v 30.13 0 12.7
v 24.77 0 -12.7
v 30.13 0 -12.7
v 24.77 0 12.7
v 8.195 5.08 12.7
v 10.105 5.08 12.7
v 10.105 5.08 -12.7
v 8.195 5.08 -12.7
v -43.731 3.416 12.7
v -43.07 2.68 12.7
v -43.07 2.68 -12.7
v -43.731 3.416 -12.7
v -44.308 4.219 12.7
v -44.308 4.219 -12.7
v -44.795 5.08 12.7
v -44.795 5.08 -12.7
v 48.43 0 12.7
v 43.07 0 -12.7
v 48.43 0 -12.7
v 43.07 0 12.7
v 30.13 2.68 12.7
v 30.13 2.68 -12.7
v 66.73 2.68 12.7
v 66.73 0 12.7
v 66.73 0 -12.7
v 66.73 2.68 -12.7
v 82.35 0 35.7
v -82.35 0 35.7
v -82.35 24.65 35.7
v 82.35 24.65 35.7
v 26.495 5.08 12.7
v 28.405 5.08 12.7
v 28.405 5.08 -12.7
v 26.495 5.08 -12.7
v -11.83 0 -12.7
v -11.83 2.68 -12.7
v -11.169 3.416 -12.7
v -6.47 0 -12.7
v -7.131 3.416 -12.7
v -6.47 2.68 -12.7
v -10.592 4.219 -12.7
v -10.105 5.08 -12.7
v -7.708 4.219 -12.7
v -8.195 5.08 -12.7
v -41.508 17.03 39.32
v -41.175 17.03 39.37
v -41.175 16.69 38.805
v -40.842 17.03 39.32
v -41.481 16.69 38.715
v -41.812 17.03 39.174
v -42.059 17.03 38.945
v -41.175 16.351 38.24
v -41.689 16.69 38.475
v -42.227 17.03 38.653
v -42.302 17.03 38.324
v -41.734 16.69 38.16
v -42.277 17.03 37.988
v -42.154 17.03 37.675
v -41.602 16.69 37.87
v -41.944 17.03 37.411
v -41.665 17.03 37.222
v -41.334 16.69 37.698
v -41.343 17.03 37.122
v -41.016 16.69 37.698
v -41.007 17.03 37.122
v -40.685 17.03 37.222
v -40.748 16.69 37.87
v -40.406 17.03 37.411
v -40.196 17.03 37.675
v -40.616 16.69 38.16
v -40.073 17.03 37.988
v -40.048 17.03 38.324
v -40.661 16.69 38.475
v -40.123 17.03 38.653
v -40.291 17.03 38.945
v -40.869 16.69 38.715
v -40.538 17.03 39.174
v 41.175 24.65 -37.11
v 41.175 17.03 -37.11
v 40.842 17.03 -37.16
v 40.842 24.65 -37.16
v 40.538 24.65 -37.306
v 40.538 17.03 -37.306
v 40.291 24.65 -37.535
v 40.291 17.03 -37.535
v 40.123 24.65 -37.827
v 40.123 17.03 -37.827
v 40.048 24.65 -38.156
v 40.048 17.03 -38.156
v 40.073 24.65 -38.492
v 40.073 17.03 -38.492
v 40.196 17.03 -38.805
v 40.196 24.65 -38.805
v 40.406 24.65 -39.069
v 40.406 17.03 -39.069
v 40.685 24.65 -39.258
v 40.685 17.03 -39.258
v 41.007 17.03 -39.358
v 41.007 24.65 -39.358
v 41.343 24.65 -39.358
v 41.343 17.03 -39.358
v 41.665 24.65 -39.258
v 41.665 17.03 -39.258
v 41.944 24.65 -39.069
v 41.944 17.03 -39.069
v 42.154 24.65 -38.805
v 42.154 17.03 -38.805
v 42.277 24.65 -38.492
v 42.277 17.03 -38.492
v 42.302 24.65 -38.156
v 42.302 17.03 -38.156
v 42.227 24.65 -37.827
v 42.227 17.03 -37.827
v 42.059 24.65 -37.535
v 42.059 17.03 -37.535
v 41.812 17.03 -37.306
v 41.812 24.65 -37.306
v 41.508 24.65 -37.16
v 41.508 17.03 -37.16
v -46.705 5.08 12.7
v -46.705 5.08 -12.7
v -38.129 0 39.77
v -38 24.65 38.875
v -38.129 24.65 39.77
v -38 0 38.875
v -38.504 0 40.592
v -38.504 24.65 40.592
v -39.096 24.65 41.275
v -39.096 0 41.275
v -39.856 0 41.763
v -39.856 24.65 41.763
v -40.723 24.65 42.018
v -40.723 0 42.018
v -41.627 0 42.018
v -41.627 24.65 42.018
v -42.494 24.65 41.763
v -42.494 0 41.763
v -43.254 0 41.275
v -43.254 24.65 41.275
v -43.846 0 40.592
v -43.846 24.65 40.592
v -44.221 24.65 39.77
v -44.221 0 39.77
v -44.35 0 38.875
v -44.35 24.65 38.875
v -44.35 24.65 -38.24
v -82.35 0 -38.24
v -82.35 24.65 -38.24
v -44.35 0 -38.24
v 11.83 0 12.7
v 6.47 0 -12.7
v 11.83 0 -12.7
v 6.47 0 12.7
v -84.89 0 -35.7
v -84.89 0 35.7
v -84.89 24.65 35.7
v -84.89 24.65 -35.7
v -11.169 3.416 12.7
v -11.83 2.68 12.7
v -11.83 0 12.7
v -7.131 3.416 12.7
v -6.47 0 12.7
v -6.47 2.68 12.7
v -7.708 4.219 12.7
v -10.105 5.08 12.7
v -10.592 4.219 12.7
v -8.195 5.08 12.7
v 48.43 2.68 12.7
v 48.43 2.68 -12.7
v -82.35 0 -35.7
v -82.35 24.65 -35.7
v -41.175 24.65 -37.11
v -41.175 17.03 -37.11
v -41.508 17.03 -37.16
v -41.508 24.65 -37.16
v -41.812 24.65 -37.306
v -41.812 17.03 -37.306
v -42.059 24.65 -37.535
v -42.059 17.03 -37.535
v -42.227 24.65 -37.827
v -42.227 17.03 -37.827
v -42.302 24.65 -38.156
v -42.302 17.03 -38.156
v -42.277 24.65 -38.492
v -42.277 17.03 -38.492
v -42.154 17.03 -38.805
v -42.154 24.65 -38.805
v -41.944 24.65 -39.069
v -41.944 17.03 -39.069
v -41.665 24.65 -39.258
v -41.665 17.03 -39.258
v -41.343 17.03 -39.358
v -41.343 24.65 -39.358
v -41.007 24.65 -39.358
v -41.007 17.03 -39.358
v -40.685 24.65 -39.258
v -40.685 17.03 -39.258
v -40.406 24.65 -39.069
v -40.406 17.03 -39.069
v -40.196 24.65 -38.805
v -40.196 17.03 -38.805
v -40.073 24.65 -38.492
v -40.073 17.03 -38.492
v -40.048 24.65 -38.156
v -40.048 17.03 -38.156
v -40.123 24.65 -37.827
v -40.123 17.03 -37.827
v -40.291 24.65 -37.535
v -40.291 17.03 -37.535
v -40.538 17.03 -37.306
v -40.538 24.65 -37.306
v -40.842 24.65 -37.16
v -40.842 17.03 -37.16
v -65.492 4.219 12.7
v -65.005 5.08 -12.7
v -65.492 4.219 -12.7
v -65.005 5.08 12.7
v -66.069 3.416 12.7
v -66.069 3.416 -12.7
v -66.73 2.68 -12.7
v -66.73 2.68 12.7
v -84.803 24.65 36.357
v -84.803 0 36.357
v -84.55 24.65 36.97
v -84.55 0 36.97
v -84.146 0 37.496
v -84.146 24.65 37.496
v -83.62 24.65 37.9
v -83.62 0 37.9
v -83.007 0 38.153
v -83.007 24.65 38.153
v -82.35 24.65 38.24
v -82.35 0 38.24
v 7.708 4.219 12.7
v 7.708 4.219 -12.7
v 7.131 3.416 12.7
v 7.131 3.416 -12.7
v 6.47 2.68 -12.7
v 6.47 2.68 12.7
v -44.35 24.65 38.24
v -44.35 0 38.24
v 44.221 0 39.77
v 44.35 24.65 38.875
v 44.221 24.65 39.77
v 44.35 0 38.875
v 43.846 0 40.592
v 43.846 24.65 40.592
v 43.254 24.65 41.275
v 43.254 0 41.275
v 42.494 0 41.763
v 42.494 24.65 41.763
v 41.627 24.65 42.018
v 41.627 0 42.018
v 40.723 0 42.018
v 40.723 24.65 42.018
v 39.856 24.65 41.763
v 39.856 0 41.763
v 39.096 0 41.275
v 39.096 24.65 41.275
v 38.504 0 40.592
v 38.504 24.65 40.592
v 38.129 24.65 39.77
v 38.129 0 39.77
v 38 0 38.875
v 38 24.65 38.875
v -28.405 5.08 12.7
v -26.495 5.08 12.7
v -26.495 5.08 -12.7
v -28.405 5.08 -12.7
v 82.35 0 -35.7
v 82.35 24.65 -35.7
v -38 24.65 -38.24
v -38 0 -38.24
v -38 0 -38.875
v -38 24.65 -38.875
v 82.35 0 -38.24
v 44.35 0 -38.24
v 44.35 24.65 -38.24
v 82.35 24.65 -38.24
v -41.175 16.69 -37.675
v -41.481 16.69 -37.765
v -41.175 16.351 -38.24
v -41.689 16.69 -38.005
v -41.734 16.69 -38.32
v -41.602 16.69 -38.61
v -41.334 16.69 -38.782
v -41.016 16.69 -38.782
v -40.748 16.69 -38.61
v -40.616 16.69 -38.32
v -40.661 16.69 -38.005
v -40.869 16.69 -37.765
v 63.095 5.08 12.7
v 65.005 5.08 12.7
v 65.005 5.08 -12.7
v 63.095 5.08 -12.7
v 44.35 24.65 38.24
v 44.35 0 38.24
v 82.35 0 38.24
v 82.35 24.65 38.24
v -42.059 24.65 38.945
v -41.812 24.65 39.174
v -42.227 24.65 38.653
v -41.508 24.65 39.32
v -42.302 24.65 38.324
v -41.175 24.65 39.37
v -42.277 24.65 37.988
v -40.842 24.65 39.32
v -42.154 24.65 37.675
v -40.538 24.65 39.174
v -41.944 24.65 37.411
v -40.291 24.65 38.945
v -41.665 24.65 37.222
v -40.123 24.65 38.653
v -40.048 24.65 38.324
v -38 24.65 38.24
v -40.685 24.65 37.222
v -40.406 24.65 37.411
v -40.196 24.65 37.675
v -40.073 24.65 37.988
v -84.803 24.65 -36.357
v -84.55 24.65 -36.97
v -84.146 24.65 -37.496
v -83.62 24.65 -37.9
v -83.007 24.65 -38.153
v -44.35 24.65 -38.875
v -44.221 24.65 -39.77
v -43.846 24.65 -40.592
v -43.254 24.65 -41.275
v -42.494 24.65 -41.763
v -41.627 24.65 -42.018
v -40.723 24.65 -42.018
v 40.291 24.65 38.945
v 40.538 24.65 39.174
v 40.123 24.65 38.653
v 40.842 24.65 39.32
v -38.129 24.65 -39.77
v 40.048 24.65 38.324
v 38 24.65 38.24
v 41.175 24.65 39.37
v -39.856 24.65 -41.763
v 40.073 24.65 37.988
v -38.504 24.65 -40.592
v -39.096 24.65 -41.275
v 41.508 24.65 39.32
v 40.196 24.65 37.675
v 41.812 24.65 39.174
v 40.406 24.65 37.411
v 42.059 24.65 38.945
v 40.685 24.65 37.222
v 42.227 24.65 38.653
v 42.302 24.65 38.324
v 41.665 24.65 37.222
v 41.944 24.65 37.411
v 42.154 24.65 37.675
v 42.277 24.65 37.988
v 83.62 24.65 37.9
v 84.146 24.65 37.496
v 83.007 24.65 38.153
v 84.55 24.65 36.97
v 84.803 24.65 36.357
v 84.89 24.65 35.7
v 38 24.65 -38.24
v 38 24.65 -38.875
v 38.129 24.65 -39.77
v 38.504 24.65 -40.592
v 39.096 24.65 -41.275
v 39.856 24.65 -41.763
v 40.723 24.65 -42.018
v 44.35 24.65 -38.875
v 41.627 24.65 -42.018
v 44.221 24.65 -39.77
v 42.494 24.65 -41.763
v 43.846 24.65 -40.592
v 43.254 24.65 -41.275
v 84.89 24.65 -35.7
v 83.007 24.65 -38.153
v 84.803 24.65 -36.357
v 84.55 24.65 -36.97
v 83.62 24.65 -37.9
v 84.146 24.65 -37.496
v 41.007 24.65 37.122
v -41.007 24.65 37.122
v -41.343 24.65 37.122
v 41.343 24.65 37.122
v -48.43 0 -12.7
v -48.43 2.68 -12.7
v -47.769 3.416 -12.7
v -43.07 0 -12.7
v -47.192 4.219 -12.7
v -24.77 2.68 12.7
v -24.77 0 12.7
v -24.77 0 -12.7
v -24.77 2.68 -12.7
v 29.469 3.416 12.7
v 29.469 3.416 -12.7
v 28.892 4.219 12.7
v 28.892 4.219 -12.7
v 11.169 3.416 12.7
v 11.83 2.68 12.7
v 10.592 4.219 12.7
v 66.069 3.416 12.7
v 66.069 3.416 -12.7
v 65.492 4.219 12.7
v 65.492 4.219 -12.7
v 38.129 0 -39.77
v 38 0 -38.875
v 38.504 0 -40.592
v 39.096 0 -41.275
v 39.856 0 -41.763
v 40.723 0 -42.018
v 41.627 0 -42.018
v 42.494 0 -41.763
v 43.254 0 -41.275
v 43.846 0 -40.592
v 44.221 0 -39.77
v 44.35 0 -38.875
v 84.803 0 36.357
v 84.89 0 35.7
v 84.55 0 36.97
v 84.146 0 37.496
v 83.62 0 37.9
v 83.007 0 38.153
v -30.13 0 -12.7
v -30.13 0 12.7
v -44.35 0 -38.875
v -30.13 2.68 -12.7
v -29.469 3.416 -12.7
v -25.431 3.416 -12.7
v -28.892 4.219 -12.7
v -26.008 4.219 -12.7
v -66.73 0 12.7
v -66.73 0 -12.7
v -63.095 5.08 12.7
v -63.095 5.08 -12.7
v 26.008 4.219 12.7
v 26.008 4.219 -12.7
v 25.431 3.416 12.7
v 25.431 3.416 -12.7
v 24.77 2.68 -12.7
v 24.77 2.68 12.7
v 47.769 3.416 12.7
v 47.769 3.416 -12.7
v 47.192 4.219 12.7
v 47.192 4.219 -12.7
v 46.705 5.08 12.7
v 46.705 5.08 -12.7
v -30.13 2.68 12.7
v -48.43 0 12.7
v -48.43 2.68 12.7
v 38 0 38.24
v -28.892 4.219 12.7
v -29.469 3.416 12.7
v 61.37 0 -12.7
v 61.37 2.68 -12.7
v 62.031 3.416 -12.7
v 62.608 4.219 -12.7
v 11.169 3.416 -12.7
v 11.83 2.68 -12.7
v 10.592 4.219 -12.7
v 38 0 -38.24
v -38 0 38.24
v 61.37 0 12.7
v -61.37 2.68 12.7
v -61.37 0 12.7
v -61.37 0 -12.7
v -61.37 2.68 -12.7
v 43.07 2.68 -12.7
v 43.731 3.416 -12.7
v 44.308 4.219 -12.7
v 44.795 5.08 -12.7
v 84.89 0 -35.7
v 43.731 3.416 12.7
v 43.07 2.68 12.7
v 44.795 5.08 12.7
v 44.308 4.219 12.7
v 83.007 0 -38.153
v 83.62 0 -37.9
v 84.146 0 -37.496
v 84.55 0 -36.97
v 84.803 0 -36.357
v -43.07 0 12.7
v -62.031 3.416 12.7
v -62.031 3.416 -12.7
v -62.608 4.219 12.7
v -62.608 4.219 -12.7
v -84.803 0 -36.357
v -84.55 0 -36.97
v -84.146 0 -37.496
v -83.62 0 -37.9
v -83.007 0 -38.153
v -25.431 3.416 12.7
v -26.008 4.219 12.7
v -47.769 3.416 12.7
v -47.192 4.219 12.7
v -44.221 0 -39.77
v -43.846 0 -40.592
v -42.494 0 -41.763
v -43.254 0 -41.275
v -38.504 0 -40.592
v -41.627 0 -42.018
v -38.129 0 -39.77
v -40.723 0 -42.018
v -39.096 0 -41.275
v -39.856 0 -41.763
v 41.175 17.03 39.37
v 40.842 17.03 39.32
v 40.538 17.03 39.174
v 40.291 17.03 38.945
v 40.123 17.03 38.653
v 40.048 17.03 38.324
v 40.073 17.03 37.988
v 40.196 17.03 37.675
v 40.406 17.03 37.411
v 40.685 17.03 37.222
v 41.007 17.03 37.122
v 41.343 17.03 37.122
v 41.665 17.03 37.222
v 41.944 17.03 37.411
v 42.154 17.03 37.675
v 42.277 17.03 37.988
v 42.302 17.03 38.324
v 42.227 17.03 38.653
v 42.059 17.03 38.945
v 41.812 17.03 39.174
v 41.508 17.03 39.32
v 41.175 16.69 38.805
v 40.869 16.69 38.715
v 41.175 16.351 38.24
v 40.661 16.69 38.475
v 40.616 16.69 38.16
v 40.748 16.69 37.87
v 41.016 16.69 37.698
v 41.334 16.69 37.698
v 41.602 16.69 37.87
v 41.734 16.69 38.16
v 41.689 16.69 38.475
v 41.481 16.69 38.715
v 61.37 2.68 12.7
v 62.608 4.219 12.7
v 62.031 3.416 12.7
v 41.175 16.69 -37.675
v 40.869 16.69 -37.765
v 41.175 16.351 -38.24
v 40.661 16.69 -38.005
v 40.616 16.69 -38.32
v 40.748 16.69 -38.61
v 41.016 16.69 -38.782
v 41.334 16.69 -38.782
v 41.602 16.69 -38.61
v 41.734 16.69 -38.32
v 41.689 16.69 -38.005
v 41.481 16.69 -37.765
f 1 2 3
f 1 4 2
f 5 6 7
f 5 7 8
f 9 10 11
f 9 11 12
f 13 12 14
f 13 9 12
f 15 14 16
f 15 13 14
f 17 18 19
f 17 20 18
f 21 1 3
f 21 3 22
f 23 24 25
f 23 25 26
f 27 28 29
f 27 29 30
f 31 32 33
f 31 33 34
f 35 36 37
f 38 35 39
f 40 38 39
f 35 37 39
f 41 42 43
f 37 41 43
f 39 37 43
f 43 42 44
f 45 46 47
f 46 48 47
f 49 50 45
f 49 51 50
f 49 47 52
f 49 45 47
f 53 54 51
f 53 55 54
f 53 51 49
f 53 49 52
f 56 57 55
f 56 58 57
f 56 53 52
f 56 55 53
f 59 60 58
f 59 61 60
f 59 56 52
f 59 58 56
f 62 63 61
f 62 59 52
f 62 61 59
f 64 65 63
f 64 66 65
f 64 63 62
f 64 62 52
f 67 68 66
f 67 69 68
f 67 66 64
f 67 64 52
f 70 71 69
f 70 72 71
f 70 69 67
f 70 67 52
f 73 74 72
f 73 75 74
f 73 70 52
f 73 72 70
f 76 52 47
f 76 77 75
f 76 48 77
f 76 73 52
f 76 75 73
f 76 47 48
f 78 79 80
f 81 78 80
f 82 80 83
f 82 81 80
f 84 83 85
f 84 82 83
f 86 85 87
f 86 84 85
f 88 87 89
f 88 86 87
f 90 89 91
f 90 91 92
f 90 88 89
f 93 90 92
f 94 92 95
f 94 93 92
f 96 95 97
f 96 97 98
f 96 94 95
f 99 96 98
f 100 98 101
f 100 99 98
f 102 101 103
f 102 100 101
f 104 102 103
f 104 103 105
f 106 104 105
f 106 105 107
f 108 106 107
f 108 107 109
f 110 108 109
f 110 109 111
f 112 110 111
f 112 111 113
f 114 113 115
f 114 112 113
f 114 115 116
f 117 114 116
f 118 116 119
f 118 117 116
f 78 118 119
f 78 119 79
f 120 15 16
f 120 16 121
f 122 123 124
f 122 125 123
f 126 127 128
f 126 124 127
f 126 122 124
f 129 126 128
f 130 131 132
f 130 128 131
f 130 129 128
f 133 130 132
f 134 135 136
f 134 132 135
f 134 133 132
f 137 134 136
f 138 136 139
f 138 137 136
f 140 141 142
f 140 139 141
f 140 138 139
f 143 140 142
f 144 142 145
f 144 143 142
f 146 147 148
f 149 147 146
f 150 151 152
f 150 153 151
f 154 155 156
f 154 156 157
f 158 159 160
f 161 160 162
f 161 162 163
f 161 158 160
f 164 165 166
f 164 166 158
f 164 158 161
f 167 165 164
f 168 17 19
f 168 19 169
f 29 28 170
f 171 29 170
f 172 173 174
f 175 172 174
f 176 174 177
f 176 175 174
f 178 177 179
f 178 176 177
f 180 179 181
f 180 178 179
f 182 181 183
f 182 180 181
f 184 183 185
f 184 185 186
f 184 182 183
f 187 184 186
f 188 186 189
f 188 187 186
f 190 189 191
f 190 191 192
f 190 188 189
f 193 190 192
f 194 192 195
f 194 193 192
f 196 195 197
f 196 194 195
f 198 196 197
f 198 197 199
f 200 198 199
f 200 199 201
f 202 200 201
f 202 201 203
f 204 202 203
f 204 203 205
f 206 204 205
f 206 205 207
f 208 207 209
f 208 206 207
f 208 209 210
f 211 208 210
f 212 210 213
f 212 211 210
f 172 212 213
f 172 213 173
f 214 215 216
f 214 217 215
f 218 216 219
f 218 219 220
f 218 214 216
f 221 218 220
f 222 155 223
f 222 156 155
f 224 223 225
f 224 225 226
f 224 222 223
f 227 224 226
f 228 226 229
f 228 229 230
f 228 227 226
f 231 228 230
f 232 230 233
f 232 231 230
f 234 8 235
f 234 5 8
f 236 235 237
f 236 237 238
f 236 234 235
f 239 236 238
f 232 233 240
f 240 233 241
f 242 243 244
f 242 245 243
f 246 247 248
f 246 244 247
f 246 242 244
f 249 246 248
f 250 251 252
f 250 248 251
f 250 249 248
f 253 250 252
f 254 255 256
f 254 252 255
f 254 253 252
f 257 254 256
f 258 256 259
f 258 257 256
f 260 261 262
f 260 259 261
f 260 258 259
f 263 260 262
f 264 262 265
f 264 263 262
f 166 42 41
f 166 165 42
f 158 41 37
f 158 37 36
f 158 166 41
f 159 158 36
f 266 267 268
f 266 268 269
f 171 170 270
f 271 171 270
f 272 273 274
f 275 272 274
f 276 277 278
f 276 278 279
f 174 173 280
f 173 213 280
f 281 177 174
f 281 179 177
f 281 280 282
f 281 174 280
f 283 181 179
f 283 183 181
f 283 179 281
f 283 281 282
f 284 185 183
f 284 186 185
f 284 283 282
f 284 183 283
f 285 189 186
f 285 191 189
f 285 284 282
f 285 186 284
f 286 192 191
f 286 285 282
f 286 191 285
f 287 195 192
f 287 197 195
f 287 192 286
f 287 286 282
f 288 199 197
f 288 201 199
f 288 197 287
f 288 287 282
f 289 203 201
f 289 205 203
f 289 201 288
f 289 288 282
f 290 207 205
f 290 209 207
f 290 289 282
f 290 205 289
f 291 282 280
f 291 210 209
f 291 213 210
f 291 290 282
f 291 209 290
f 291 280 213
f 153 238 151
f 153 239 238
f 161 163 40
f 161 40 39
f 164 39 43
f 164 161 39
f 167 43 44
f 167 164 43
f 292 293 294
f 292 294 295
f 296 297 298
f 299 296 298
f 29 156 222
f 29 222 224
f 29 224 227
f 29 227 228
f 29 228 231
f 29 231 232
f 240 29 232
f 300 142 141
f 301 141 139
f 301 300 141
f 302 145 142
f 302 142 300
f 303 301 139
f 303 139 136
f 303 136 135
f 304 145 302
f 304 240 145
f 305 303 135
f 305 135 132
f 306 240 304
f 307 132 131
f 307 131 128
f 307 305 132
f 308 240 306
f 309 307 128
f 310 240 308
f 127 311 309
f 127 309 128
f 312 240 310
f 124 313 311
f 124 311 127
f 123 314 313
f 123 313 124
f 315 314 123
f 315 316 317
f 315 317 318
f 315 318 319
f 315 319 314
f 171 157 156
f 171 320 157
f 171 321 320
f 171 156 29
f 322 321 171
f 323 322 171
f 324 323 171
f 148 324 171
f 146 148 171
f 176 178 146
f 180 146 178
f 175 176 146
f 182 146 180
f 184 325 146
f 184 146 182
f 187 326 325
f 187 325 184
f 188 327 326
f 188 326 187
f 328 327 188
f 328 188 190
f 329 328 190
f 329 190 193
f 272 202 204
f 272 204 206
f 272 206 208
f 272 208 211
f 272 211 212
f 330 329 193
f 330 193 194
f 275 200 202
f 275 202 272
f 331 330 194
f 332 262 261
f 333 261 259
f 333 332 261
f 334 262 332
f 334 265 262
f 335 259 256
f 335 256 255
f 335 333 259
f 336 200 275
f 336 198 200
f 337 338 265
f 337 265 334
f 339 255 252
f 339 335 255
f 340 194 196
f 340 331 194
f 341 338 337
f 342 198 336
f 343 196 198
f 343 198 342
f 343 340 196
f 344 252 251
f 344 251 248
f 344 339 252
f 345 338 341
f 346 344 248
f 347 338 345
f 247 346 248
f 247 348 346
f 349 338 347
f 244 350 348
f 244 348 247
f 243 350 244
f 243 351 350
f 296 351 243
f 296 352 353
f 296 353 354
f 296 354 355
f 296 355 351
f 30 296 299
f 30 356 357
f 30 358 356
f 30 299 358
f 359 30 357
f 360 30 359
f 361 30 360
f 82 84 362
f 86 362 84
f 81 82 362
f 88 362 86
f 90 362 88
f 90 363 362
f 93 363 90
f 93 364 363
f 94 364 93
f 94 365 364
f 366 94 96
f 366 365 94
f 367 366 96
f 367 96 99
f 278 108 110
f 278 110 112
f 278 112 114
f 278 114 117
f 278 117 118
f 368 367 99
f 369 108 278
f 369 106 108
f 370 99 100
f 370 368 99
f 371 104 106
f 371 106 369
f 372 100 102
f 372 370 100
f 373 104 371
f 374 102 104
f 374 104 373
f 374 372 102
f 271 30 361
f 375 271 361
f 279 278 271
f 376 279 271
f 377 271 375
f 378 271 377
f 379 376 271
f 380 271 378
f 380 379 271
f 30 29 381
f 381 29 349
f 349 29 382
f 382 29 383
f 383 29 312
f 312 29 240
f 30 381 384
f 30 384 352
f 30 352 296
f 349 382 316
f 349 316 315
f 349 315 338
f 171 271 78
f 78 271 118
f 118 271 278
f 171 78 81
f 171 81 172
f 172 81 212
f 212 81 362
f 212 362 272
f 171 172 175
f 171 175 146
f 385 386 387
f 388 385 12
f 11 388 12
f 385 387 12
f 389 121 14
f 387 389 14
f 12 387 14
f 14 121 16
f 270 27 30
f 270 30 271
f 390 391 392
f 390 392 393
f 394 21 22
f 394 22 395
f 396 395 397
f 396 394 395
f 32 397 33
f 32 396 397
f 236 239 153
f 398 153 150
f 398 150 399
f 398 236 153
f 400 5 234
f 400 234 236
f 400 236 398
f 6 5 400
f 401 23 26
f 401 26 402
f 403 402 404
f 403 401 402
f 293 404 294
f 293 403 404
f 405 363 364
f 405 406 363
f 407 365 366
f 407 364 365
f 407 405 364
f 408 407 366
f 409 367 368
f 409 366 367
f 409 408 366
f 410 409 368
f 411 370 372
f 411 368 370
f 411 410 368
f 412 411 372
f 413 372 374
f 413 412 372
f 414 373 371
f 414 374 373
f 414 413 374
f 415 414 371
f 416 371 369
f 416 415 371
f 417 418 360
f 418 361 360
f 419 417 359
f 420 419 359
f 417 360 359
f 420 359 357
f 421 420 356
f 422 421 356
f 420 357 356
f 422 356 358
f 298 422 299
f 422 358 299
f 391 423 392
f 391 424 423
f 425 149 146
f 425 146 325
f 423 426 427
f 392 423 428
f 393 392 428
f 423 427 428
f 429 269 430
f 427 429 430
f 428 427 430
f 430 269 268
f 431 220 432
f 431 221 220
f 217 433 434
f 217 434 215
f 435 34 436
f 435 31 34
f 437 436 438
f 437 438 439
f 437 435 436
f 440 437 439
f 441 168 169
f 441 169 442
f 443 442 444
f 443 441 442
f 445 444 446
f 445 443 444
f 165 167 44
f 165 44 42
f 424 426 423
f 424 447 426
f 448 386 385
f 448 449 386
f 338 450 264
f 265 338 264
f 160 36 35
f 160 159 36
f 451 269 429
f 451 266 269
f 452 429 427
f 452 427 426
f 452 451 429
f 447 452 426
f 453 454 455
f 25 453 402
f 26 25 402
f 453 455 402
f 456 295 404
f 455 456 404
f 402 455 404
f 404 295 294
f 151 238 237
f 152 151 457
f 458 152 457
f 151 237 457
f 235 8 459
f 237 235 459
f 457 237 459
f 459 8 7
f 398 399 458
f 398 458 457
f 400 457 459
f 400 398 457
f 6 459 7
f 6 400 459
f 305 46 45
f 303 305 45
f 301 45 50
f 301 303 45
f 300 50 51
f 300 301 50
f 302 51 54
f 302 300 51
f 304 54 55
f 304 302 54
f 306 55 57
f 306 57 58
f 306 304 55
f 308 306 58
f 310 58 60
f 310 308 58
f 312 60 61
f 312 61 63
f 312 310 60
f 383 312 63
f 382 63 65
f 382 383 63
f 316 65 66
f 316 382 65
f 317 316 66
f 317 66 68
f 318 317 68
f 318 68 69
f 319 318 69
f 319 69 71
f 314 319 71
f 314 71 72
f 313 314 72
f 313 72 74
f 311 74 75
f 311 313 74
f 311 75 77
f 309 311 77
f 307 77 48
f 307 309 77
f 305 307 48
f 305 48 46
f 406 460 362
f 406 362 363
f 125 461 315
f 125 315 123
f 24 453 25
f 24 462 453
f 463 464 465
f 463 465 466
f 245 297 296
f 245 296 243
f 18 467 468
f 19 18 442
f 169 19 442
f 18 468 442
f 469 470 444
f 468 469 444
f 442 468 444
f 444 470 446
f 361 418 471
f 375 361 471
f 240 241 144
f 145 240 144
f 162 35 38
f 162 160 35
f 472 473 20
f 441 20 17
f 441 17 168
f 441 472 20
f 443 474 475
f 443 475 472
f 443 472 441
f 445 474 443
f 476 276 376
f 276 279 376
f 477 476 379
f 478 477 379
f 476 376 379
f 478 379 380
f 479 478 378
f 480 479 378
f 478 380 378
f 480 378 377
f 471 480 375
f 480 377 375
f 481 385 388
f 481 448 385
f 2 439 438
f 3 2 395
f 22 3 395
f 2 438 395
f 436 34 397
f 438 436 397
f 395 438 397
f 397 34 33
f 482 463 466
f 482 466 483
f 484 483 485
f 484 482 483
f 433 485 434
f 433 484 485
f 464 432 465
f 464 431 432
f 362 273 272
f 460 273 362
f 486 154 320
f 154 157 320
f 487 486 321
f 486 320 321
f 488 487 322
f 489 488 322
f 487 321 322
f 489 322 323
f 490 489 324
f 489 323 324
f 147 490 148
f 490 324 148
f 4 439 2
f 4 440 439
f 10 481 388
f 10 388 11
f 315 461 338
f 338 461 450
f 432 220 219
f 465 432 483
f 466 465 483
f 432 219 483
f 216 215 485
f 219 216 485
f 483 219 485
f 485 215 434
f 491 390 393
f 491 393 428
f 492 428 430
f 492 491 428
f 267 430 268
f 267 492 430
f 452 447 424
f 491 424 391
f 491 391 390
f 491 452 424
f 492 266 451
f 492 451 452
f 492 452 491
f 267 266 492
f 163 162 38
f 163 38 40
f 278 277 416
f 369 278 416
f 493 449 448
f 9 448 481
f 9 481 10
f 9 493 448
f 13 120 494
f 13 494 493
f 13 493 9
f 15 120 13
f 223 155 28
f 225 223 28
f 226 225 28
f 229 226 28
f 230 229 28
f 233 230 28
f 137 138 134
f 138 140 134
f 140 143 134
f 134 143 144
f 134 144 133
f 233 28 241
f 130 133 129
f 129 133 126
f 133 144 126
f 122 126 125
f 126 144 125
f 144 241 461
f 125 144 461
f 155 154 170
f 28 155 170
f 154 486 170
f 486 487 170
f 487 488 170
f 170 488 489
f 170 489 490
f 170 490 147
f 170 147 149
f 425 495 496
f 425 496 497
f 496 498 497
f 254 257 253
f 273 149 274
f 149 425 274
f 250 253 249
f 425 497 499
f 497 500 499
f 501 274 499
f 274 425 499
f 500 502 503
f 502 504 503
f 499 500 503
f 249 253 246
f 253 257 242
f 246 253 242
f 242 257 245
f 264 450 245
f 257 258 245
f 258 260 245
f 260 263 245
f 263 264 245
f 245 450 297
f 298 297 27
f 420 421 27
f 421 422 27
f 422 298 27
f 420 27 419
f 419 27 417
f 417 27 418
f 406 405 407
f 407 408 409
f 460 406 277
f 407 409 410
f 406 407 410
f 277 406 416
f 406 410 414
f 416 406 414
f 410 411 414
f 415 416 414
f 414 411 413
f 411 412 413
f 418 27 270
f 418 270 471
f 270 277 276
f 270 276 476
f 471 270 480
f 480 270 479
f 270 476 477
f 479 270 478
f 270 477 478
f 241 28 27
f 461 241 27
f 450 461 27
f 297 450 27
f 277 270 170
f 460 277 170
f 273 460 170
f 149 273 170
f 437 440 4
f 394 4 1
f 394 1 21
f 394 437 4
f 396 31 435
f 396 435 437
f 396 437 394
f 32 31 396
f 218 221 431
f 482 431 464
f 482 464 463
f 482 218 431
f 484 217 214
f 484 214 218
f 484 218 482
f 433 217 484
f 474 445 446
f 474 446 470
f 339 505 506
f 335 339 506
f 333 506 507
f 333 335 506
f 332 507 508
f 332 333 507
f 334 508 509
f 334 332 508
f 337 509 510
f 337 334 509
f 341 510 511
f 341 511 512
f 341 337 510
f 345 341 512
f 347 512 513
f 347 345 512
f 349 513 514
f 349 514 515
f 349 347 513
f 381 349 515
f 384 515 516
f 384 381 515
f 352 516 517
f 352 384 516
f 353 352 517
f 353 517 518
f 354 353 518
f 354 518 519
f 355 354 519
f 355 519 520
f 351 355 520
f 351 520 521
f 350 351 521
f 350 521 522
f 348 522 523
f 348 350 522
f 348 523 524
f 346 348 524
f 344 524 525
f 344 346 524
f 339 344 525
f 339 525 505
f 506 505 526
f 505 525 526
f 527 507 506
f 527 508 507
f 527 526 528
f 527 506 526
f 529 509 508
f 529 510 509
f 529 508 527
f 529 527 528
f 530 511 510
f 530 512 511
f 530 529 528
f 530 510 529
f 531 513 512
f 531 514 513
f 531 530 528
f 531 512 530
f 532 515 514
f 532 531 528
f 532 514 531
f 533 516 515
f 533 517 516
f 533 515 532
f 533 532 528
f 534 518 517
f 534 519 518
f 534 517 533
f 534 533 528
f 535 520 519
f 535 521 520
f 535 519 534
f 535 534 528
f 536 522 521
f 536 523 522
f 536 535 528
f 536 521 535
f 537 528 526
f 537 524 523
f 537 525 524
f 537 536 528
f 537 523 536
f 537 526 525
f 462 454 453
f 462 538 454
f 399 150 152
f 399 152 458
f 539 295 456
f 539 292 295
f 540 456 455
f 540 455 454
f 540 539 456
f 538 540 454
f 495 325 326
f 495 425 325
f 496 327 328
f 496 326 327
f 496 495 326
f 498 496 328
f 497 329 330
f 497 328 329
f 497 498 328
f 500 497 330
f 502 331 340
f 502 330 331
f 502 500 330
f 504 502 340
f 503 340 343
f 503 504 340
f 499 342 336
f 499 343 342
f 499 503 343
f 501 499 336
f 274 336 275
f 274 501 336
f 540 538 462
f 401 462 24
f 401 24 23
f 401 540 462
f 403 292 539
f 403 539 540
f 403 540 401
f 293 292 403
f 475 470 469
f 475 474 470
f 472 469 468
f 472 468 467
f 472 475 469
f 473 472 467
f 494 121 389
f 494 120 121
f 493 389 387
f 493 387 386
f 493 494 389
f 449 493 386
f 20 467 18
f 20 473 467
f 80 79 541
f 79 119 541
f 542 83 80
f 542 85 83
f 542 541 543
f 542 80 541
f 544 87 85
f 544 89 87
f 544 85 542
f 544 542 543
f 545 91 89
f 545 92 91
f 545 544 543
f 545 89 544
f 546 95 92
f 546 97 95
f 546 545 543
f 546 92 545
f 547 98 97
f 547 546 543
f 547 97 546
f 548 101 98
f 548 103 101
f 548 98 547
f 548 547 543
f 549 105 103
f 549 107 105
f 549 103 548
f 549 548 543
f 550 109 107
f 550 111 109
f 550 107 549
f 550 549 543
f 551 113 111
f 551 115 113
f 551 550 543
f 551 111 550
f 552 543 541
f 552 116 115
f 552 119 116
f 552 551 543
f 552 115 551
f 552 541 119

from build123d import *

# Parameters (mm, degrees)
BOSS_EXTRUDE1_OUTLINE_W        = 169.78
BOSS_EXTRUDE1_OUTLINE_H        = 76.48
BOSS_EXTRUDE1_OUTLINE_W_2      = 164.7
BOSS_EXTRUDE1_OUTLINE_H_2      = 71.4
BOSS_EXTRUDE1_DEPTH            = 24.65
BOSS_EXTRUDE2_DEPTH            = 12.7
LPATTERN2_COUNT                = 8
LPATTERN2_PITCH                = 18.3
SKETCH6_W                      = 6.35
SKETCH6_H                      = 3.81
BOSS_EXTRUDE3_DEPTH            = 24.65
MIRROR2_COPY_1_SKETCH_W        = 6.35
MIRROR2_COPY_1_SKETCH_H        = 3.81
MIRROR2_COPY_1_DEPTH           = 24.65
F_4_40_TAPPED_HOLE1_AT_2_COUNT = 2
F_4_40_TAPPED_HOLE1_AT_2_PITCH = 82.35
F_4_40_TAPPED_HOLE1_AT_3_COUNT = 2
F_4_40_TAPPED_HOLE1_AT_3_PITCH = 112.386444467
F_4_40_TAPPED_HOLE1_AT_4_COUNT = 2
F_4_40_TAPPED_HOLE1_AT_4_PITCH = 76.48
FILLET1_RADIUS                 = 3.175
FILLET1_LENGTH                 = 24.65
FILLET2_RADIUS                 = 3.175
FILLET2_LENGTH                 = 24.65
FILLET3_RADIUS                 = 3.175
FILLET3_LENGTH                 = 24.65
FILLET4_RADIUS                 = 3.175
FILLET4_LENGTH                 = 24.65
FILLET5_R                      = 2.54


# Read off the part's stored shape, not the designer's step: Boss-Extrude1
with BuildPart() as part:
    # Boss-Extrude1 outline → Boss-Extrude1 (new body)
    with BuildSketch(Plane(origin=(0, 0, 0), x_dir=(1, 0, 0), z_dir=(0, 1, 0))):
        Rectangle(BOSS_EXTRUDE1_OUTLINE_W, BOSS_EXTRUDE1_OUTLINE_H)
        Rectangle(BOSS_EXTRUDE1_OUTLINE_W_2, BOSS_EXTRUDE1_OUTLINE_H_2, mode=Mode.SUBTRACT)
    extrude(amount=BOSS_EXTRUDE1_DEPTH)

    # Sketch6 → Boss-Extrude3 (add)
    with BuildSketch(Plane(origin=(0, 24.65, 0), x_dir=(1, 0, 0), z_dir=(0, 1, 0))):
        with Locations((-41.175, 40.145)):
            Rectangle(SKETCH6_W, SKETCH6_H)
    boss_extrude3 = extrude(amount=-BOSS_EXTRUDE3_DEPTH)

    # Mirror1: Boss-Extrude3 across plane
    add(boss_extrude3.mirror(Plane(origin=(0, 0, 0), x_dir=(0, 0, 1), z_dir=(1, 0, 0))))

    # Mirror2: Boss-Extrude3 across plane
    add(boss_extrude3.mirror(Plane.XY))

    # Mirror2 copy 1 sketch → Mirror2 copy 1 (add)
    with BuildSketch(Plane(origin=(0, 24.65, 0), x_dir=(-1, 0, 0), z_dir=(0, 1, 0))):
        with Locations((-41.175, 40.145)):
            Rectangle(MIRROR2_COPY_1_SKETCH_W, MIRROR2_COPY_1_SKETCH_H)
    extrude(amount=-MIRROR2_COPY_1_DEPTH)

    # Sketch7 → #4-40 Tapped Hole1 (revolve, cut)
    with BuildSketch(Plane(origin=(-41.175, 24.65, -38.24), x_dir=(0, 0, 1), z_dir=(1, 0, 0))):
        Polygon((0, 0), (0, 8.299152758), (1.1303, 7.62), (1.1303, 0), align=None)
    f_4_40_tapped_hole1 = revolve(axis=Axis((-41.175, 31, -38.24), (0, -1, 0)), mode=Mode.SUBTRACT)

    # #4-40 Tapped Hole1 at 2: #4-40 Tapped Hole1 ×2
    with Locations(*[(i * F_4_40_TAPPED_HOLE1_AT_2_PITCH, 0, 0) for i in range(1, F_4_40_TAPPED_HOLE1_AT_2_COUNT)]):
        add(f_4_40_tapped_hole1, mode=Mode.SUBTRACT)

    # #4-40 Tapped Hole1 at 3: #4-40 Tapped Hole1 ×2
    with Locations(*[Vector(0.732739614553475, 0, 0.6805091162240408) * (i * F_4_40_TAPPED_HOLE1_AT_3_PITCH) for i in range(1, F_4_40_TAPPED_HOLE1_AT_3_COUNT)]):
        add(f_4_40_tapped_hole1, mode=Mode.SUBTRACT)

    # #4-40 Tapped Hole1 at 4: #4-40 Tapped Hole1 ×2
    with Locations(*[(0, 0, i * F_4_40_TAPPED_HOLE1_AT_4_PITCH) for i in range(1, F_4_40_TAPPED_HOLE1_AT_4_COUNT)]):
        add(f_4_40_tapped_hole1, mode=Mode.SUBTRACT)

    # Fillet1: full round fillet: the end face becomes a half cylinder, R = half its width
    fillet1_face = Plane((-41.175, 12.325, -42.05), x_dir=(0, -1, 0), z_dir=(0, 0, -1))  # on the end face: x along it, z out of the body
    fillet1_slab = fillet1_face.offset(-FILLET1_RADIUS / 2) * Box(FILLET1_LENGTH, 2 * FILLET1_RADIUS, FILLET1_RADIUS, mode=Mode.PRIVATE)  # the body's end, R deep
    fillet1_round = Plane((-41.175, 12.325, -38.875), x_dir=(0, 0, -1), z_dir=(0, -1, 0)) * Cylinder(FILLET1_RADIUS, FILLET1_LENGTH, mode=Mode.PRIVATE)  # its axis R under the face
    add(fillet1_slab - fillet1_round, mode=Mode.SUBTRACT)

    # Fillet2: full round fillet: the end face becomes a half cylinder, R = half its width
    fillet2_face = Plane((41.175, 12.325, -42.05), x_dir=(0, -1, 0), z_dir=(0, 0, -1))  # on the end face: x along it, z out of the body
    fillet2_slab = fillet2_face.offset(-FILLET2_RADIUS / 2) * Box(FILLET2_LENGTH, 2 * FILLET2_RADIUS, FILLET2_RADIUS, mode=Mode.PRIVATE)  # the body's end, R deep
    fillet2_round = Plane((41.175, 12.325, -38.875), x_dir=(0, 0, -1), z_dir=(0, -1, 0)) * Cylinder(FILLET2_RADIUS, FILLET2_LENGTH, mode=Mode.PRIVATE)  # its axis R under the face
    add(fillet2_slab - fillet2_round, mode=Mode.SUBTRACT)

    # Fillet3: full round fillet: the end face becomes a half cylinder, R = half its width
    fillet3_face = Plane((41.175, 12.325, 42.05), x_dir=(0, -1, 0), z_dir=(0, 0, 1))  # on the end face: x along it, z out of the body
    fillet3_slab = fillet3_face.offset(-FILLET3_RADIUS / 2) * Box(FILLET3_LENGTH, 2 * FILLET3_RADIUS, FILLET3_RADIUS, mode=Mode.PRIVATE)  # the body's end, R deep
    fillet3_round = Plane((41.175, 12.325, 38.875), x_dir=(0, 0, 1), z_dir=(0, -1, 0)) * Cylinder(FILLET3_RADIUS, FILLET3_LENGTH, mode=Mode.PRIVATE)  # its axis R under the face
    add(fillet3_slab - fillet3_round, mode=Mode.SUBTRACT)

    # Fillet4: full round fillet: the end face becomes a half cylinder, R = half its width
    fillet4_face = Plane((-41.175, 12.325, 42.05), x_dir=(0, -1, 0), z_dir=(0, 0, 1))  # on the end face: x along it, z out of the body
    fillet4_slab = fillet4_face.offset(-FILLET4_RADIUS / 2) * Box(FILLET4_LENGTH, 2 * FILLET4_RADIUS, FILLET4_RADIUS, mode=Mode.PRIVATE)  # the body's end, R deep
    fillet4_round = Plane((-41.175, 12.325, 38.875), x_dir=(0, 0, 1), z_dir=(0, -1, 0)) * Cylinder(FILLET4_RADIUS, FILLET4_LENGTH, mode=Mode.PRIVATE)  # its axis R under the face
    add(fillet4_slab - fillet4_round, mode=Mode.SUBTRACT)

    # Fillet5
    fillet5_edges = [part.edges().sort_by_distance(p)[0] for p in [
        (84.89, 12.325, 38.24),
        (84.89, 12.325, -38.24),
        (-84.89, 12.325, -38.24),
        (-84.89, 12.325, 38.24),
    ]]
    fillet(fillet5_edges, radius=FILLET5_R)


with BuildPart() as body_2:
    # Sketch4 → Boss-Extrude2 (new, symmetric)
    with BuildSketch(Plane.XY):
        with BuildLine():
            Line((-66.729972952, 0), (-61.370027048, 0))
            Line((-61.370027048, 0), (-61.370027048, 2.679972952))
            ThreePointArc((-61.370027048, 2.679972952), (-62.330046898, 3.809877988), (-63.09497407, 5.08))
            Line((-63.09497407, 5.08), (-65.00502593, 5.08))
            ThreePointArc((-65.00502593, 5.08), (-65.769953102, 3.809877988), (-66.729972952, 2.679972952))
            Line((-66.729972952, 2.679972952), (-66.729972952, 0))
        make_face()
    extrude(amount=BOSS_EXTRUDE2_DEPTH, both=True)


with BuildPart() as lpattern2_1:
    # LPattern2: pattern copy
    add(body_2.part.moved(Location(Vector(1, 0, 0) * (1 * LPATTERN2_PITCH))))


with BuildPart() as lpattern2_2:
    # LPattern2: pattern copy
    add(body_2.part.moved(Location(Vector(1, 0, 0) * (2 * LPATTERN2_PITCH))))


with BuildPart() as lpattern2_3:
    # LPattern2: pattern copy
    add(body_2.part.moved(Location(Vector(1, 0, 0) * (3 * LPATTERN2_PITCH))))


with BuildPart() as lpattern2_4:
    # LPattern2: pattern copy
    add(body_2.part.moved(Location(Vector(1, 0, 0) * (4 * LPATTERN2_PITCH))))


with BuildPart() as lpattern2_5:
    # LPattern2: pattern copy
    add(body_2.part.moved(Location(Vector(1, 0, 0) * (5 * LPATTERN2_PITCH))))


with BuildPart() as lpattern2_6:
    # LPattern2: pattern copy
    add(body_2.part.moved(Location(Vector(1, 0, 0) * (6 * LPATTERN2_PITCH))))


with BuildPart() as lpattern2_7:
    # LPattern2: pattern copy
    add(body_2.part.moved(Location(Vector(1, 0, 0) * (7 * LPATTERN2_PITCH))))


solid = Compound([part.part, body_2.part, lpattern2_1.part, lpattern2_2.part, lpattern2_3.part, lpattern2_4.part, lpattern2_5.part, lpattern2_6.part, lpattern2_7.part])
